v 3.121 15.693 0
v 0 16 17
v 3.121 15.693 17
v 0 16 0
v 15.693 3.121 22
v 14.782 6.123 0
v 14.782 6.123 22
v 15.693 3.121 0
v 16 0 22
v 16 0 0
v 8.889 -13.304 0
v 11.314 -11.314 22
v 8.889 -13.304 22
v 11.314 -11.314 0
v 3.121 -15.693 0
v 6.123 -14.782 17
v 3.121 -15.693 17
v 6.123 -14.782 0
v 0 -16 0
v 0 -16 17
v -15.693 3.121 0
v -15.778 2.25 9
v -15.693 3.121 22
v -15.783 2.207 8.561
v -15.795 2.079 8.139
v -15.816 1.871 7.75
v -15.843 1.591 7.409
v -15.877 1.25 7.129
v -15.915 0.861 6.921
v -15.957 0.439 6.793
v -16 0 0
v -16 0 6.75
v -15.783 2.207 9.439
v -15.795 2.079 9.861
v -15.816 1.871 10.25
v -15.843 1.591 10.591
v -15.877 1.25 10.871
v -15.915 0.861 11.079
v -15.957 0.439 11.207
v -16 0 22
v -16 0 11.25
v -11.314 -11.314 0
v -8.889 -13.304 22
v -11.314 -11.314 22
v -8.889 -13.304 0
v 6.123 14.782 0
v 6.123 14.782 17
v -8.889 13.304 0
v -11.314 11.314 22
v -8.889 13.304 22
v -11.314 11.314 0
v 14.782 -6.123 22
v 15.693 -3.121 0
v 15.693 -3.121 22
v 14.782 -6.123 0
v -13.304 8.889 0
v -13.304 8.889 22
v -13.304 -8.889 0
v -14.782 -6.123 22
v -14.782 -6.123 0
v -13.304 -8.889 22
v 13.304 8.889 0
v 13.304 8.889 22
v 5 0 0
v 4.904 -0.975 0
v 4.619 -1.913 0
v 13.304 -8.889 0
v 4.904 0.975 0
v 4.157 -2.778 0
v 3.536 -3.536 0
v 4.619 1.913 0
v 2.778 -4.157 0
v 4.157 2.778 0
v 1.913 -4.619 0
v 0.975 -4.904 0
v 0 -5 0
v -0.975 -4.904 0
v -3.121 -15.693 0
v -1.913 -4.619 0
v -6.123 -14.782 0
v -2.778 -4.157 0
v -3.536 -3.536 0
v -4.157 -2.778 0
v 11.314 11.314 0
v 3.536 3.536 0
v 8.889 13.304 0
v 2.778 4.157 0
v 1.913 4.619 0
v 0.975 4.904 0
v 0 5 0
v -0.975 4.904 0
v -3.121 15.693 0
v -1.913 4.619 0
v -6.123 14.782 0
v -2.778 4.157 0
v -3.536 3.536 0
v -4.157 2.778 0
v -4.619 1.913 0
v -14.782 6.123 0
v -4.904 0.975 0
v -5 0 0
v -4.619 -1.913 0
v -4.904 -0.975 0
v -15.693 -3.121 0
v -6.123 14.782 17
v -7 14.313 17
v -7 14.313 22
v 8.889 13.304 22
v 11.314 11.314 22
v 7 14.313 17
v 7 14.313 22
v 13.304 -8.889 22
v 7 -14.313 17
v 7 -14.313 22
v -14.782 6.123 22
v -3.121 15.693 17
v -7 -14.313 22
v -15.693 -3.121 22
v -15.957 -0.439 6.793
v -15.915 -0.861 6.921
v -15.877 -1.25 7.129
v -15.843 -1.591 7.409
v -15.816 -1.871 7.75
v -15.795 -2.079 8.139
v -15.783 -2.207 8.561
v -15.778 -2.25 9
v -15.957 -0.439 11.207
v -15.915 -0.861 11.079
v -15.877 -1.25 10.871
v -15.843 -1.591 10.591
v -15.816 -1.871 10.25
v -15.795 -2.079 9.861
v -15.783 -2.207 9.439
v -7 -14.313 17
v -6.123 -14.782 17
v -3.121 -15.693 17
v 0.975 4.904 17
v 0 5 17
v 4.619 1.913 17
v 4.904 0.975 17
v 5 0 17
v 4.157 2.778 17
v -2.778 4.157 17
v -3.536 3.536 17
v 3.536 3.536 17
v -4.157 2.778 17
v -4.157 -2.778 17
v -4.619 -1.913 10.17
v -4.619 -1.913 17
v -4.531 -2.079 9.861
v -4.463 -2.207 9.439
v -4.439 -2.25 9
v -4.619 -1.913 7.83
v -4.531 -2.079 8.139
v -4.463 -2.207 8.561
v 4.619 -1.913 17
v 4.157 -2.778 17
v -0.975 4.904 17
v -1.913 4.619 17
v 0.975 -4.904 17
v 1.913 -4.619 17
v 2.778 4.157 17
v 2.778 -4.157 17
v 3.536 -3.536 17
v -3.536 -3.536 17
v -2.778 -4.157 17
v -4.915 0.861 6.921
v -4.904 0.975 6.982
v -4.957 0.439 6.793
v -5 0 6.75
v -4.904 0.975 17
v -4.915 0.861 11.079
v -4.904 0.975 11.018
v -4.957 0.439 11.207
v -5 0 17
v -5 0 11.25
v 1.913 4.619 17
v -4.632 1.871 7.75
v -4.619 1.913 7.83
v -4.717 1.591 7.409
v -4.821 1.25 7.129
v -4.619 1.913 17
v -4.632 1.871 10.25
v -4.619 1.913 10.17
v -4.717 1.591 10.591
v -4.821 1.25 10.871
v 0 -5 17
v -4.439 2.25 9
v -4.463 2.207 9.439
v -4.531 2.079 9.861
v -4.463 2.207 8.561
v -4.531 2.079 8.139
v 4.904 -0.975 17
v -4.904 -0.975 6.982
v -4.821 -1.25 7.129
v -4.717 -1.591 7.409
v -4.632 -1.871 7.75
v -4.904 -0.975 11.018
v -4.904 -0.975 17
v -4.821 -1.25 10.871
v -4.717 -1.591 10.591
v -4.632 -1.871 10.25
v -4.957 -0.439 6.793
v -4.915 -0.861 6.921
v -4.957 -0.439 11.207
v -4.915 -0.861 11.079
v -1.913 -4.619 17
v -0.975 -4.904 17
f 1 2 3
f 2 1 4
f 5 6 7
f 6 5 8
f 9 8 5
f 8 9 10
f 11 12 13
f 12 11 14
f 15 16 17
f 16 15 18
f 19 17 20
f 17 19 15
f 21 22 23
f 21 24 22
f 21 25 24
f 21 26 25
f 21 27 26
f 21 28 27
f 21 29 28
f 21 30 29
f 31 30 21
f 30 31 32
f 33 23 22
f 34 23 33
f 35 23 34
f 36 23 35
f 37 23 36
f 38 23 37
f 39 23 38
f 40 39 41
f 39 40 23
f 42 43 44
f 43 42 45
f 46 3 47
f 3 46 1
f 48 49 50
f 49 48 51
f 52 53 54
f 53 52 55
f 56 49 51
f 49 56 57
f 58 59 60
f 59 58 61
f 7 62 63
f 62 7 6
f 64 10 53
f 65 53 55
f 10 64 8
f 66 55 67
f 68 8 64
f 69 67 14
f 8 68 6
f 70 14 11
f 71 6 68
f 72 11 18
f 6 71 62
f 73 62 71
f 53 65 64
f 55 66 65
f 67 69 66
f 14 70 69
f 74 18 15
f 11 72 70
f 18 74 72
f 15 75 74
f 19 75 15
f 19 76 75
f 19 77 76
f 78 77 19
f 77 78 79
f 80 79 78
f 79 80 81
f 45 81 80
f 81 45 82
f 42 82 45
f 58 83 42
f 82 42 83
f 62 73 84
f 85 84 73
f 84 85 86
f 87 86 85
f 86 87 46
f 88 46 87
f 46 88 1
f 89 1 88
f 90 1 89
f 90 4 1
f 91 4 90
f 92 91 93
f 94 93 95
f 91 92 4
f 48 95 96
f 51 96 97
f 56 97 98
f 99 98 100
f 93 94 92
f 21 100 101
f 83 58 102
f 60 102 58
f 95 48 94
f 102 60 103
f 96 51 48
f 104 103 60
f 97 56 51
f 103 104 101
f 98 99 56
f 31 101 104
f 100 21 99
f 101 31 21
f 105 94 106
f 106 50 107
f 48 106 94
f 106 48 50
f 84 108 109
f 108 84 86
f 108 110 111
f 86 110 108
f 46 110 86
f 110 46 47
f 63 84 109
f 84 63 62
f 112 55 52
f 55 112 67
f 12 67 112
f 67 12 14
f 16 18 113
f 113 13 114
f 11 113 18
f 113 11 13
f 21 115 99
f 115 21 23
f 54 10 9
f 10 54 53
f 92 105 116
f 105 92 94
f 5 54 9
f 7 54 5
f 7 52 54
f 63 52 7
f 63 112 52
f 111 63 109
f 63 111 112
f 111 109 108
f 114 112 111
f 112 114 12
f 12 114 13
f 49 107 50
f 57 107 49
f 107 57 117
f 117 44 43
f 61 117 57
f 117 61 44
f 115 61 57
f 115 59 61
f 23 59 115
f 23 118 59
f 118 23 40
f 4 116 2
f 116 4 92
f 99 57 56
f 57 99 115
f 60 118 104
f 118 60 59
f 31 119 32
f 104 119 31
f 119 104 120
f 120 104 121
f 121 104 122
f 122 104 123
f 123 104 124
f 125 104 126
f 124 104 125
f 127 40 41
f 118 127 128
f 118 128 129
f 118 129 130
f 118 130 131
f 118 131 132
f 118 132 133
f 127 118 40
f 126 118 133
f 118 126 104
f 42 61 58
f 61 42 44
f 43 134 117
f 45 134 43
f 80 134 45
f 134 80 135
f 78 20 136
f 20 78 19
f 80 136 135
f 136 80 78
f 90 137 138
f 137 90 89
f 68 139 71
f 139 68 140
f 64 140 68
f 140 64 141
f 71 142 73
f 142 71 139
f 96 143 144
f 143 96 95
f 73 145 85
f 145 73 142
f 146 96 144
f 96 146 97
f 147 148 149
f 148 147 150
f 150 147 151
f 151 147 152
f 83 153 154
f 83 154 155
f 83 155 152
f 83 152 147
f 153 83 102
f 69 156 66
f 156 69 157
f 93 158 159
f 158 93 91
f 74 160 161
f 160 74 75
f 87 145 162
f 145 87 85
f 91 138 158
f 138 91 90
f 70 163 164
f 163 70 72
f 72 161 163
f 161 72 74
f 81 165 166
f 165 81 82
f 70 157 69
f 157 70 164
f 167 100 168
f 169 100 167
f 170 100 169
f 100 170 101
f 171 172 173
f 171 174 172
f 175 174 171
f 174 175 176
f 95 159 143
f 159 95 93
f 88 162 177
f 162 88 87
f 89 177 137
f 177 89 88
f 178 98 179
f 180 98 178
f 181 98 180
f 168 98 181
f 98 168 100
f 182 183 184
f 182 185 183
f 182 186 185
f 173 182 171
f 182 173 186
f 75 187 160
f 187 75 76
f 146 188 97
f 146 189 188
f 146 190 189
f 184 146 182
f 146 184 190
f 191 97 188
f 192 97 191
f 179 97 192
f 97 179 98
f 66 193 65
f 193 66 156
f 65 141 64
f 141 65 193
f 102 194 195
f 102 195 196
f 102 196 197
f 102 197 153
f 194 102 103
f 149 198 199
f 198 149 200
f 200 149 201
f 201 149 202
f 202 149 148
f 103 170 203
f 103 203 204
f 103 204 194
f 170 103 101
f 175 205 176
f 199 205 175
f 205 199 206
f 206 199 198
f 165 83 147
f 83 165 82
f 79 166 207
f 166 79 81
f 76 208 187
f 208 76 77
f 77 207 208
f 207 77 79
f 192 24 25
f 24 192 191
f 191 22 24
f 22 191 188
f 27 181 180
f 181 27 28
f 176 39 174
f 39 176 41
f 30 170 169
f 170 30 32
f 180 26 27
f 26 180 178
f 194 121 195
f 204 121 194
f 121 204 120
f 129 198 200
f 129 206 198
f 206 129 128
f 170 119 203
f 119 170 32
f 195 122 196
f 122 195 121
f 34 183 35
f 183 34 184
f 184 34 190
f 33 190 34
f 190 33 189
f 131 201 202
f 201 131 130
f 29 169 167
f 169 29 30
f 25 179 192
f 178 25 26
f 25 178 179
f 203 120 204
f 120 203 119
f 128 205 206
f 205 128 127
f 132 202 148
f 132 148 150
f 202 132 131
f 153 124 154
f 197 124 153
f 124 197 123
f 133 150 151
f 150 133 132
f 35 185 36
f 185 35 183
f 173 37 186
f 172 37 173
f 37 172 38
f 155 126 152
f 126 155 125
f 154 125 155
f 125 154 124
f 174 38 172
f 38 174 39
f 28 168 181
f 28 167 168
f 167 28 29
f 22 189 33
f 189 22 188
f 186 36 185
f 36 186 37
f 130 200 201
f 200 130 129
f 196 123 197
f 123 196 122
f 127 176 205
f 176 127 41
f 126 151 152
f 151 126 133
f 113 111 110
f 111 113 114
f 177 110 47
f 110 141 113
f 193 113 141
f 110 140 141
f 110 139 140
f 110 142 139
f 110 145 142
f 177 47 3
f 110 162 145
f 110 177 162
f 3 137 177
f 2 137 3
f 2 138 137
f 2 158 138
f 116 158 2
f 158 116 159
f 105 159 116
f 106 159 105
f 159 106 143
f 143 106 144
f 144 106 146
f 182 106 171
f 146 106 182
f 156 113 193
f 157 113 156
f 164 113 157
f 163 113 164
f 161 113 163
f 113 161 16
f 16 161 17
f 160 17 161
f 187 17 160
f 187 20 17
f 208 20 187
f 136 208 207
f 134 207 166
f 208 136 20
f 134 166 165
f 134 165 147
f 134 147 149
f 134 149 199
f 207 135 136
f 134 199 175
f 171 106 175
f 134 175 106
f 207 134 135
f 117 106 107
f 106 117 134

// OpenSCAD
$fn = 32;

// ----------------------------------------------------------------------
// Oldham coupling hub: 32 x 22 mm
// ----------------------------------------------------------------------

// --- parameters (mm) ---
flange_dia = 32;          // hub diameter
flange_len = 18;          // hub length
hub_bore = 10;            // shaft bore
key_w = 14;               // drive tongue width
tongue_h = 4;             // drive tongue height
set_d = 4.5;              // set screw tap hole

module hub() {
  /* the slot side is a raised disc with a groove milled across it */
  cylinder(h = flange_len + tongue_h, d = flange_dia);
}

difference() {
  hub();
  translate([0, 0, -1]) cylinder(h = flange_len + tongue_h + 2, d = hub_bore);
  translate([-flange_dia / 2 - 1, 0, flange_len * 0.5])
    rotate([0, 90, 0]) cylinder(h = flange_dia / 2 + 2, d = set_d);
  translate([-key_w / 2, -flange_dia / 2 - 1, flange_len - 1])
    cube([key_w, flange_dia + 2, tongue_h + 1]);
}
